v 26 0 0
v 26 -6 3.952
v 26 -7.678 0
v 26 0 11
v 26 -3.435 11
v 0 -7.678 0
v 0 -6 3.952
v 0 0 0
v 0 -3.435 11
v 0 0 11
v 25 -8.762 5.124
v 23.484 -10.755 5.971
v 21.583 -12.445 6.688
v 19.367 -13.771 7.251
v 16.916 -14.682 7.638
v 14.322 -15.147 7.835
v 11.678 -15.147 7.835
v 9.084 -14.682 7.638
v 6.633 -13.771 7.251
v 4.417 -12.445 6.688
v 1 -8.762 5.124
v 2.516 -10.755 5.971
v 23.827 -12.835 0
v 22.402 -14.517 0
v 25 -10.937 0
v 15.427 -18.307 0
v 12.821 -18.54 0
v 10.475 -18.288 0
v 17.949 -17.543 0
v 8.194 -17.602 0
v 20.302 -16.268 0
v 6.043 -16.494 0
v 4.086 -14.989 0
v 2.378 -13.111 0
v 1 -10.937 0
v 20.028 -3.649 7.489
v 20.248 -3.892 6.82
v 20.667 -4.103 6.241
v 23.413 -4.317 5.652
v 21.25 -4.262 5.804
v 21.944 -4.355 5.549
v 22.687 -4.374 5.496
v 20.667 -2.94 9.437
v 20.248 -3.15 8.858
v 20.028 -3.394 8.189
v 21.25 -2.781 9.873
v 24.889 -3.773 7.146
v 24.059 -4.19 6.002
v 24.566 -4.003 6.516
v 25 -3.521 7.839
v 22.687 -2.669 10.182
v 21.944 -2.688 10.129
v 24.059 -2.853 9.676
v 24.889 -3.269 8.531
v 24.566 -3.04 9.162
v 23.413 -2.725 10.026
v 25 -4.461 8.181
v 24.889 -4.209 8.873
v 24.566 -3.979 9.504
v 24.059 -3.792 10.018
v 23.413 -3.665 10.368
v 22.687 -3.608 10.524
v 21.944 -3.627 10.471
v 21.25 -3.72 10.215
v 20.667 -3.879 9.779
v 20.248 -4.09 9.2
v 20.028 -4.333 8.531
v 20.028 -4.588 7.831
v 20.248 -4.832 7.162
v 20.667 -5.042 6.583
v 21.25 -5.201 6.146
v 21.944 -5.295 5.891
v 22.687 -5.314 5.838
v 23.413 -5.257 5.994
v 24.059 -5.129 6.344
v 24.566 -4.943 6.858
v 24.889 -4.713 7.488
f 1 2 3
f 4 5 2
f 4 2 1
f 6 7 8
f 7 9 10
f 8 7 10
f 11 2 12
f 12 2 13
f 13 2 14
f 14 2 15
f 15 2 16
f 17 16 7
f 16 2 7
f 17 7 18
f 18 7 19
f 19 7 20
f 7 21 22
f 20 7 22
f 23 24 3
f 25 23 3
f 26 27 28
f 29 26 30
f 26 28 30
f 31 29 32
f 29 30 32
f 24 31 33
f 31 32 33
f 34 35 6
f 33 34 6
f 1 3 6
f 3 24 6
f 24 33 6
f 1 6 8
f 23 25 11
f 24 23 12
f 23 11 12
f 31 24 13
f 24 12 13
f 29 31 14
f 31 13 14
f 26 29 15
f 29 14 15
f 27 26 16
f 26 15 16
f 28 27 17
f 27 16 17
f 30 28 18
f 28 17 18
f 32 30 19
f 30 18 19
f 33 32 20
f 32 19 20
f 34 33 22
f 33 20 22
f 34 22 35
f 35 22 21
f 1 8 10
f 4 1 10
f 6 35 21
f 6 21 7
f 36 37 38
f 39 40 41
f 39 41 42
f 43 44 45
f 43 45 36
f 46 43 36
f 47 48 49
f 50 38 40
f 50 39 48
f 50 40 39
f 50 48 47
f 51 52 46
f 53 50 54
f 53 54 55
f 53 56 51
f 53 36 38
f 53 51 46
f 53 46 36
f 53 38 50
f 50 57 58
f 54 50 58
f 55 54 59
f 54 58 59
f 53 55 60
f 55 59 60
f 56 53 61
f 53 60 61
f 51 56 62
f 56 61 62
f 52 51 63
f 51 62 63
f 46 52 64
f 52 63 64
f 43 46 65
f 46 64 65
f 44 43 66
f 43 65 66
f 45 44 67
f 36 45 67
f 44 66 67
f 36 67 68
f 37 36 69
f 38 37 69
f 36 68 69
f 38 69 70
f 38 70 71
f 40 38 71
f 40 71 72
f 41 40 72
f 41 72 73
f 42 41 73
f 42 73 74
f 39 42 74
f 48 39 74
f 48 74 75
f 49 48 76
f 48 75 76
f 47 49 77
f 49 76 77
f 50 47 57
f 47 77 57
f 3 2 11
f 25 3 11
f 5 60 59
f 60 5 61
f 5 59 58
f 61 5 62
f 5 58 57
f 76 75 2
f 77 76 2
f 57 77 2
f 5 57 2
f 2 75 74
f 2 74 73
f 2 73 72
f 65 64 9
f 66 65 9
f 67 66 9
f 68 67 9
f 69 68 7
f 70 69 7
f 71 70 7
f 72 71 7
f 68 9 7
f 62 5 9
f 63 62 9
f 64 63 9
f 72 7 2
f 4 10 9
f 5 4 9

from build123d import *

# Parameters (mm, degrees)
F1_DEPTH = 26
F2_R     = 2.5
F3_DEPTH = 1
F5_DEPTH = 9.1093520504


with BuildPart() as f1:
    # F0 (on Right) → F1 (new body)
    with BuildSketch(Plane.YZ):
        Polygon((0, 0), (0, 11), (-3.4348489251, 11), (-6, 3.9523053441), (-20, 9.894952771), (-20, 0), align=None)
    extrude(amount=F1_DEPTH)

    # F2 (on face) → F3 (cut)
    with BuildSketch(Plane(origin=(0, -6.5683797818, 2.3906947279), x_dir=(1, 0, 0), z_dir=(0, -0.9396926208, 0.3420201433))):
        with Locations((22.5, 6.161831307)):
            Circle(F2_R)
    extrude(amount=-F3_DEPTH, mode=Mode.SUBTRACT)

    # F4 (on face) → F5 (cut, through all)
    with BuildSketch(Plane(origin=(0, 0.5055003799, 1.190884266), x_dir=(1, 0, 0), z_dir=(0, 0.3907311285, 0.9205048535))):
        with BuildLine():
            Line((26, -7.067317848), (25, -10.067317848))
            ThreePointArc((25, -10.067317848), (13, -17.067317848), (1, -10.067317848))
            Line((1, -10.067317848), (0, -7.067317848))
            Line((0, -7.067317848), (0, -22.2763631316))
            Line((0, -22.2763631316), (26, -22.2763631316))
            Line((26, -22.2763631316), (26, -7.067317848))
        make_face()
    extrude(amount=-F5_DEPTH, mode=Mode.SUBTRACT)


solid = f1.part
